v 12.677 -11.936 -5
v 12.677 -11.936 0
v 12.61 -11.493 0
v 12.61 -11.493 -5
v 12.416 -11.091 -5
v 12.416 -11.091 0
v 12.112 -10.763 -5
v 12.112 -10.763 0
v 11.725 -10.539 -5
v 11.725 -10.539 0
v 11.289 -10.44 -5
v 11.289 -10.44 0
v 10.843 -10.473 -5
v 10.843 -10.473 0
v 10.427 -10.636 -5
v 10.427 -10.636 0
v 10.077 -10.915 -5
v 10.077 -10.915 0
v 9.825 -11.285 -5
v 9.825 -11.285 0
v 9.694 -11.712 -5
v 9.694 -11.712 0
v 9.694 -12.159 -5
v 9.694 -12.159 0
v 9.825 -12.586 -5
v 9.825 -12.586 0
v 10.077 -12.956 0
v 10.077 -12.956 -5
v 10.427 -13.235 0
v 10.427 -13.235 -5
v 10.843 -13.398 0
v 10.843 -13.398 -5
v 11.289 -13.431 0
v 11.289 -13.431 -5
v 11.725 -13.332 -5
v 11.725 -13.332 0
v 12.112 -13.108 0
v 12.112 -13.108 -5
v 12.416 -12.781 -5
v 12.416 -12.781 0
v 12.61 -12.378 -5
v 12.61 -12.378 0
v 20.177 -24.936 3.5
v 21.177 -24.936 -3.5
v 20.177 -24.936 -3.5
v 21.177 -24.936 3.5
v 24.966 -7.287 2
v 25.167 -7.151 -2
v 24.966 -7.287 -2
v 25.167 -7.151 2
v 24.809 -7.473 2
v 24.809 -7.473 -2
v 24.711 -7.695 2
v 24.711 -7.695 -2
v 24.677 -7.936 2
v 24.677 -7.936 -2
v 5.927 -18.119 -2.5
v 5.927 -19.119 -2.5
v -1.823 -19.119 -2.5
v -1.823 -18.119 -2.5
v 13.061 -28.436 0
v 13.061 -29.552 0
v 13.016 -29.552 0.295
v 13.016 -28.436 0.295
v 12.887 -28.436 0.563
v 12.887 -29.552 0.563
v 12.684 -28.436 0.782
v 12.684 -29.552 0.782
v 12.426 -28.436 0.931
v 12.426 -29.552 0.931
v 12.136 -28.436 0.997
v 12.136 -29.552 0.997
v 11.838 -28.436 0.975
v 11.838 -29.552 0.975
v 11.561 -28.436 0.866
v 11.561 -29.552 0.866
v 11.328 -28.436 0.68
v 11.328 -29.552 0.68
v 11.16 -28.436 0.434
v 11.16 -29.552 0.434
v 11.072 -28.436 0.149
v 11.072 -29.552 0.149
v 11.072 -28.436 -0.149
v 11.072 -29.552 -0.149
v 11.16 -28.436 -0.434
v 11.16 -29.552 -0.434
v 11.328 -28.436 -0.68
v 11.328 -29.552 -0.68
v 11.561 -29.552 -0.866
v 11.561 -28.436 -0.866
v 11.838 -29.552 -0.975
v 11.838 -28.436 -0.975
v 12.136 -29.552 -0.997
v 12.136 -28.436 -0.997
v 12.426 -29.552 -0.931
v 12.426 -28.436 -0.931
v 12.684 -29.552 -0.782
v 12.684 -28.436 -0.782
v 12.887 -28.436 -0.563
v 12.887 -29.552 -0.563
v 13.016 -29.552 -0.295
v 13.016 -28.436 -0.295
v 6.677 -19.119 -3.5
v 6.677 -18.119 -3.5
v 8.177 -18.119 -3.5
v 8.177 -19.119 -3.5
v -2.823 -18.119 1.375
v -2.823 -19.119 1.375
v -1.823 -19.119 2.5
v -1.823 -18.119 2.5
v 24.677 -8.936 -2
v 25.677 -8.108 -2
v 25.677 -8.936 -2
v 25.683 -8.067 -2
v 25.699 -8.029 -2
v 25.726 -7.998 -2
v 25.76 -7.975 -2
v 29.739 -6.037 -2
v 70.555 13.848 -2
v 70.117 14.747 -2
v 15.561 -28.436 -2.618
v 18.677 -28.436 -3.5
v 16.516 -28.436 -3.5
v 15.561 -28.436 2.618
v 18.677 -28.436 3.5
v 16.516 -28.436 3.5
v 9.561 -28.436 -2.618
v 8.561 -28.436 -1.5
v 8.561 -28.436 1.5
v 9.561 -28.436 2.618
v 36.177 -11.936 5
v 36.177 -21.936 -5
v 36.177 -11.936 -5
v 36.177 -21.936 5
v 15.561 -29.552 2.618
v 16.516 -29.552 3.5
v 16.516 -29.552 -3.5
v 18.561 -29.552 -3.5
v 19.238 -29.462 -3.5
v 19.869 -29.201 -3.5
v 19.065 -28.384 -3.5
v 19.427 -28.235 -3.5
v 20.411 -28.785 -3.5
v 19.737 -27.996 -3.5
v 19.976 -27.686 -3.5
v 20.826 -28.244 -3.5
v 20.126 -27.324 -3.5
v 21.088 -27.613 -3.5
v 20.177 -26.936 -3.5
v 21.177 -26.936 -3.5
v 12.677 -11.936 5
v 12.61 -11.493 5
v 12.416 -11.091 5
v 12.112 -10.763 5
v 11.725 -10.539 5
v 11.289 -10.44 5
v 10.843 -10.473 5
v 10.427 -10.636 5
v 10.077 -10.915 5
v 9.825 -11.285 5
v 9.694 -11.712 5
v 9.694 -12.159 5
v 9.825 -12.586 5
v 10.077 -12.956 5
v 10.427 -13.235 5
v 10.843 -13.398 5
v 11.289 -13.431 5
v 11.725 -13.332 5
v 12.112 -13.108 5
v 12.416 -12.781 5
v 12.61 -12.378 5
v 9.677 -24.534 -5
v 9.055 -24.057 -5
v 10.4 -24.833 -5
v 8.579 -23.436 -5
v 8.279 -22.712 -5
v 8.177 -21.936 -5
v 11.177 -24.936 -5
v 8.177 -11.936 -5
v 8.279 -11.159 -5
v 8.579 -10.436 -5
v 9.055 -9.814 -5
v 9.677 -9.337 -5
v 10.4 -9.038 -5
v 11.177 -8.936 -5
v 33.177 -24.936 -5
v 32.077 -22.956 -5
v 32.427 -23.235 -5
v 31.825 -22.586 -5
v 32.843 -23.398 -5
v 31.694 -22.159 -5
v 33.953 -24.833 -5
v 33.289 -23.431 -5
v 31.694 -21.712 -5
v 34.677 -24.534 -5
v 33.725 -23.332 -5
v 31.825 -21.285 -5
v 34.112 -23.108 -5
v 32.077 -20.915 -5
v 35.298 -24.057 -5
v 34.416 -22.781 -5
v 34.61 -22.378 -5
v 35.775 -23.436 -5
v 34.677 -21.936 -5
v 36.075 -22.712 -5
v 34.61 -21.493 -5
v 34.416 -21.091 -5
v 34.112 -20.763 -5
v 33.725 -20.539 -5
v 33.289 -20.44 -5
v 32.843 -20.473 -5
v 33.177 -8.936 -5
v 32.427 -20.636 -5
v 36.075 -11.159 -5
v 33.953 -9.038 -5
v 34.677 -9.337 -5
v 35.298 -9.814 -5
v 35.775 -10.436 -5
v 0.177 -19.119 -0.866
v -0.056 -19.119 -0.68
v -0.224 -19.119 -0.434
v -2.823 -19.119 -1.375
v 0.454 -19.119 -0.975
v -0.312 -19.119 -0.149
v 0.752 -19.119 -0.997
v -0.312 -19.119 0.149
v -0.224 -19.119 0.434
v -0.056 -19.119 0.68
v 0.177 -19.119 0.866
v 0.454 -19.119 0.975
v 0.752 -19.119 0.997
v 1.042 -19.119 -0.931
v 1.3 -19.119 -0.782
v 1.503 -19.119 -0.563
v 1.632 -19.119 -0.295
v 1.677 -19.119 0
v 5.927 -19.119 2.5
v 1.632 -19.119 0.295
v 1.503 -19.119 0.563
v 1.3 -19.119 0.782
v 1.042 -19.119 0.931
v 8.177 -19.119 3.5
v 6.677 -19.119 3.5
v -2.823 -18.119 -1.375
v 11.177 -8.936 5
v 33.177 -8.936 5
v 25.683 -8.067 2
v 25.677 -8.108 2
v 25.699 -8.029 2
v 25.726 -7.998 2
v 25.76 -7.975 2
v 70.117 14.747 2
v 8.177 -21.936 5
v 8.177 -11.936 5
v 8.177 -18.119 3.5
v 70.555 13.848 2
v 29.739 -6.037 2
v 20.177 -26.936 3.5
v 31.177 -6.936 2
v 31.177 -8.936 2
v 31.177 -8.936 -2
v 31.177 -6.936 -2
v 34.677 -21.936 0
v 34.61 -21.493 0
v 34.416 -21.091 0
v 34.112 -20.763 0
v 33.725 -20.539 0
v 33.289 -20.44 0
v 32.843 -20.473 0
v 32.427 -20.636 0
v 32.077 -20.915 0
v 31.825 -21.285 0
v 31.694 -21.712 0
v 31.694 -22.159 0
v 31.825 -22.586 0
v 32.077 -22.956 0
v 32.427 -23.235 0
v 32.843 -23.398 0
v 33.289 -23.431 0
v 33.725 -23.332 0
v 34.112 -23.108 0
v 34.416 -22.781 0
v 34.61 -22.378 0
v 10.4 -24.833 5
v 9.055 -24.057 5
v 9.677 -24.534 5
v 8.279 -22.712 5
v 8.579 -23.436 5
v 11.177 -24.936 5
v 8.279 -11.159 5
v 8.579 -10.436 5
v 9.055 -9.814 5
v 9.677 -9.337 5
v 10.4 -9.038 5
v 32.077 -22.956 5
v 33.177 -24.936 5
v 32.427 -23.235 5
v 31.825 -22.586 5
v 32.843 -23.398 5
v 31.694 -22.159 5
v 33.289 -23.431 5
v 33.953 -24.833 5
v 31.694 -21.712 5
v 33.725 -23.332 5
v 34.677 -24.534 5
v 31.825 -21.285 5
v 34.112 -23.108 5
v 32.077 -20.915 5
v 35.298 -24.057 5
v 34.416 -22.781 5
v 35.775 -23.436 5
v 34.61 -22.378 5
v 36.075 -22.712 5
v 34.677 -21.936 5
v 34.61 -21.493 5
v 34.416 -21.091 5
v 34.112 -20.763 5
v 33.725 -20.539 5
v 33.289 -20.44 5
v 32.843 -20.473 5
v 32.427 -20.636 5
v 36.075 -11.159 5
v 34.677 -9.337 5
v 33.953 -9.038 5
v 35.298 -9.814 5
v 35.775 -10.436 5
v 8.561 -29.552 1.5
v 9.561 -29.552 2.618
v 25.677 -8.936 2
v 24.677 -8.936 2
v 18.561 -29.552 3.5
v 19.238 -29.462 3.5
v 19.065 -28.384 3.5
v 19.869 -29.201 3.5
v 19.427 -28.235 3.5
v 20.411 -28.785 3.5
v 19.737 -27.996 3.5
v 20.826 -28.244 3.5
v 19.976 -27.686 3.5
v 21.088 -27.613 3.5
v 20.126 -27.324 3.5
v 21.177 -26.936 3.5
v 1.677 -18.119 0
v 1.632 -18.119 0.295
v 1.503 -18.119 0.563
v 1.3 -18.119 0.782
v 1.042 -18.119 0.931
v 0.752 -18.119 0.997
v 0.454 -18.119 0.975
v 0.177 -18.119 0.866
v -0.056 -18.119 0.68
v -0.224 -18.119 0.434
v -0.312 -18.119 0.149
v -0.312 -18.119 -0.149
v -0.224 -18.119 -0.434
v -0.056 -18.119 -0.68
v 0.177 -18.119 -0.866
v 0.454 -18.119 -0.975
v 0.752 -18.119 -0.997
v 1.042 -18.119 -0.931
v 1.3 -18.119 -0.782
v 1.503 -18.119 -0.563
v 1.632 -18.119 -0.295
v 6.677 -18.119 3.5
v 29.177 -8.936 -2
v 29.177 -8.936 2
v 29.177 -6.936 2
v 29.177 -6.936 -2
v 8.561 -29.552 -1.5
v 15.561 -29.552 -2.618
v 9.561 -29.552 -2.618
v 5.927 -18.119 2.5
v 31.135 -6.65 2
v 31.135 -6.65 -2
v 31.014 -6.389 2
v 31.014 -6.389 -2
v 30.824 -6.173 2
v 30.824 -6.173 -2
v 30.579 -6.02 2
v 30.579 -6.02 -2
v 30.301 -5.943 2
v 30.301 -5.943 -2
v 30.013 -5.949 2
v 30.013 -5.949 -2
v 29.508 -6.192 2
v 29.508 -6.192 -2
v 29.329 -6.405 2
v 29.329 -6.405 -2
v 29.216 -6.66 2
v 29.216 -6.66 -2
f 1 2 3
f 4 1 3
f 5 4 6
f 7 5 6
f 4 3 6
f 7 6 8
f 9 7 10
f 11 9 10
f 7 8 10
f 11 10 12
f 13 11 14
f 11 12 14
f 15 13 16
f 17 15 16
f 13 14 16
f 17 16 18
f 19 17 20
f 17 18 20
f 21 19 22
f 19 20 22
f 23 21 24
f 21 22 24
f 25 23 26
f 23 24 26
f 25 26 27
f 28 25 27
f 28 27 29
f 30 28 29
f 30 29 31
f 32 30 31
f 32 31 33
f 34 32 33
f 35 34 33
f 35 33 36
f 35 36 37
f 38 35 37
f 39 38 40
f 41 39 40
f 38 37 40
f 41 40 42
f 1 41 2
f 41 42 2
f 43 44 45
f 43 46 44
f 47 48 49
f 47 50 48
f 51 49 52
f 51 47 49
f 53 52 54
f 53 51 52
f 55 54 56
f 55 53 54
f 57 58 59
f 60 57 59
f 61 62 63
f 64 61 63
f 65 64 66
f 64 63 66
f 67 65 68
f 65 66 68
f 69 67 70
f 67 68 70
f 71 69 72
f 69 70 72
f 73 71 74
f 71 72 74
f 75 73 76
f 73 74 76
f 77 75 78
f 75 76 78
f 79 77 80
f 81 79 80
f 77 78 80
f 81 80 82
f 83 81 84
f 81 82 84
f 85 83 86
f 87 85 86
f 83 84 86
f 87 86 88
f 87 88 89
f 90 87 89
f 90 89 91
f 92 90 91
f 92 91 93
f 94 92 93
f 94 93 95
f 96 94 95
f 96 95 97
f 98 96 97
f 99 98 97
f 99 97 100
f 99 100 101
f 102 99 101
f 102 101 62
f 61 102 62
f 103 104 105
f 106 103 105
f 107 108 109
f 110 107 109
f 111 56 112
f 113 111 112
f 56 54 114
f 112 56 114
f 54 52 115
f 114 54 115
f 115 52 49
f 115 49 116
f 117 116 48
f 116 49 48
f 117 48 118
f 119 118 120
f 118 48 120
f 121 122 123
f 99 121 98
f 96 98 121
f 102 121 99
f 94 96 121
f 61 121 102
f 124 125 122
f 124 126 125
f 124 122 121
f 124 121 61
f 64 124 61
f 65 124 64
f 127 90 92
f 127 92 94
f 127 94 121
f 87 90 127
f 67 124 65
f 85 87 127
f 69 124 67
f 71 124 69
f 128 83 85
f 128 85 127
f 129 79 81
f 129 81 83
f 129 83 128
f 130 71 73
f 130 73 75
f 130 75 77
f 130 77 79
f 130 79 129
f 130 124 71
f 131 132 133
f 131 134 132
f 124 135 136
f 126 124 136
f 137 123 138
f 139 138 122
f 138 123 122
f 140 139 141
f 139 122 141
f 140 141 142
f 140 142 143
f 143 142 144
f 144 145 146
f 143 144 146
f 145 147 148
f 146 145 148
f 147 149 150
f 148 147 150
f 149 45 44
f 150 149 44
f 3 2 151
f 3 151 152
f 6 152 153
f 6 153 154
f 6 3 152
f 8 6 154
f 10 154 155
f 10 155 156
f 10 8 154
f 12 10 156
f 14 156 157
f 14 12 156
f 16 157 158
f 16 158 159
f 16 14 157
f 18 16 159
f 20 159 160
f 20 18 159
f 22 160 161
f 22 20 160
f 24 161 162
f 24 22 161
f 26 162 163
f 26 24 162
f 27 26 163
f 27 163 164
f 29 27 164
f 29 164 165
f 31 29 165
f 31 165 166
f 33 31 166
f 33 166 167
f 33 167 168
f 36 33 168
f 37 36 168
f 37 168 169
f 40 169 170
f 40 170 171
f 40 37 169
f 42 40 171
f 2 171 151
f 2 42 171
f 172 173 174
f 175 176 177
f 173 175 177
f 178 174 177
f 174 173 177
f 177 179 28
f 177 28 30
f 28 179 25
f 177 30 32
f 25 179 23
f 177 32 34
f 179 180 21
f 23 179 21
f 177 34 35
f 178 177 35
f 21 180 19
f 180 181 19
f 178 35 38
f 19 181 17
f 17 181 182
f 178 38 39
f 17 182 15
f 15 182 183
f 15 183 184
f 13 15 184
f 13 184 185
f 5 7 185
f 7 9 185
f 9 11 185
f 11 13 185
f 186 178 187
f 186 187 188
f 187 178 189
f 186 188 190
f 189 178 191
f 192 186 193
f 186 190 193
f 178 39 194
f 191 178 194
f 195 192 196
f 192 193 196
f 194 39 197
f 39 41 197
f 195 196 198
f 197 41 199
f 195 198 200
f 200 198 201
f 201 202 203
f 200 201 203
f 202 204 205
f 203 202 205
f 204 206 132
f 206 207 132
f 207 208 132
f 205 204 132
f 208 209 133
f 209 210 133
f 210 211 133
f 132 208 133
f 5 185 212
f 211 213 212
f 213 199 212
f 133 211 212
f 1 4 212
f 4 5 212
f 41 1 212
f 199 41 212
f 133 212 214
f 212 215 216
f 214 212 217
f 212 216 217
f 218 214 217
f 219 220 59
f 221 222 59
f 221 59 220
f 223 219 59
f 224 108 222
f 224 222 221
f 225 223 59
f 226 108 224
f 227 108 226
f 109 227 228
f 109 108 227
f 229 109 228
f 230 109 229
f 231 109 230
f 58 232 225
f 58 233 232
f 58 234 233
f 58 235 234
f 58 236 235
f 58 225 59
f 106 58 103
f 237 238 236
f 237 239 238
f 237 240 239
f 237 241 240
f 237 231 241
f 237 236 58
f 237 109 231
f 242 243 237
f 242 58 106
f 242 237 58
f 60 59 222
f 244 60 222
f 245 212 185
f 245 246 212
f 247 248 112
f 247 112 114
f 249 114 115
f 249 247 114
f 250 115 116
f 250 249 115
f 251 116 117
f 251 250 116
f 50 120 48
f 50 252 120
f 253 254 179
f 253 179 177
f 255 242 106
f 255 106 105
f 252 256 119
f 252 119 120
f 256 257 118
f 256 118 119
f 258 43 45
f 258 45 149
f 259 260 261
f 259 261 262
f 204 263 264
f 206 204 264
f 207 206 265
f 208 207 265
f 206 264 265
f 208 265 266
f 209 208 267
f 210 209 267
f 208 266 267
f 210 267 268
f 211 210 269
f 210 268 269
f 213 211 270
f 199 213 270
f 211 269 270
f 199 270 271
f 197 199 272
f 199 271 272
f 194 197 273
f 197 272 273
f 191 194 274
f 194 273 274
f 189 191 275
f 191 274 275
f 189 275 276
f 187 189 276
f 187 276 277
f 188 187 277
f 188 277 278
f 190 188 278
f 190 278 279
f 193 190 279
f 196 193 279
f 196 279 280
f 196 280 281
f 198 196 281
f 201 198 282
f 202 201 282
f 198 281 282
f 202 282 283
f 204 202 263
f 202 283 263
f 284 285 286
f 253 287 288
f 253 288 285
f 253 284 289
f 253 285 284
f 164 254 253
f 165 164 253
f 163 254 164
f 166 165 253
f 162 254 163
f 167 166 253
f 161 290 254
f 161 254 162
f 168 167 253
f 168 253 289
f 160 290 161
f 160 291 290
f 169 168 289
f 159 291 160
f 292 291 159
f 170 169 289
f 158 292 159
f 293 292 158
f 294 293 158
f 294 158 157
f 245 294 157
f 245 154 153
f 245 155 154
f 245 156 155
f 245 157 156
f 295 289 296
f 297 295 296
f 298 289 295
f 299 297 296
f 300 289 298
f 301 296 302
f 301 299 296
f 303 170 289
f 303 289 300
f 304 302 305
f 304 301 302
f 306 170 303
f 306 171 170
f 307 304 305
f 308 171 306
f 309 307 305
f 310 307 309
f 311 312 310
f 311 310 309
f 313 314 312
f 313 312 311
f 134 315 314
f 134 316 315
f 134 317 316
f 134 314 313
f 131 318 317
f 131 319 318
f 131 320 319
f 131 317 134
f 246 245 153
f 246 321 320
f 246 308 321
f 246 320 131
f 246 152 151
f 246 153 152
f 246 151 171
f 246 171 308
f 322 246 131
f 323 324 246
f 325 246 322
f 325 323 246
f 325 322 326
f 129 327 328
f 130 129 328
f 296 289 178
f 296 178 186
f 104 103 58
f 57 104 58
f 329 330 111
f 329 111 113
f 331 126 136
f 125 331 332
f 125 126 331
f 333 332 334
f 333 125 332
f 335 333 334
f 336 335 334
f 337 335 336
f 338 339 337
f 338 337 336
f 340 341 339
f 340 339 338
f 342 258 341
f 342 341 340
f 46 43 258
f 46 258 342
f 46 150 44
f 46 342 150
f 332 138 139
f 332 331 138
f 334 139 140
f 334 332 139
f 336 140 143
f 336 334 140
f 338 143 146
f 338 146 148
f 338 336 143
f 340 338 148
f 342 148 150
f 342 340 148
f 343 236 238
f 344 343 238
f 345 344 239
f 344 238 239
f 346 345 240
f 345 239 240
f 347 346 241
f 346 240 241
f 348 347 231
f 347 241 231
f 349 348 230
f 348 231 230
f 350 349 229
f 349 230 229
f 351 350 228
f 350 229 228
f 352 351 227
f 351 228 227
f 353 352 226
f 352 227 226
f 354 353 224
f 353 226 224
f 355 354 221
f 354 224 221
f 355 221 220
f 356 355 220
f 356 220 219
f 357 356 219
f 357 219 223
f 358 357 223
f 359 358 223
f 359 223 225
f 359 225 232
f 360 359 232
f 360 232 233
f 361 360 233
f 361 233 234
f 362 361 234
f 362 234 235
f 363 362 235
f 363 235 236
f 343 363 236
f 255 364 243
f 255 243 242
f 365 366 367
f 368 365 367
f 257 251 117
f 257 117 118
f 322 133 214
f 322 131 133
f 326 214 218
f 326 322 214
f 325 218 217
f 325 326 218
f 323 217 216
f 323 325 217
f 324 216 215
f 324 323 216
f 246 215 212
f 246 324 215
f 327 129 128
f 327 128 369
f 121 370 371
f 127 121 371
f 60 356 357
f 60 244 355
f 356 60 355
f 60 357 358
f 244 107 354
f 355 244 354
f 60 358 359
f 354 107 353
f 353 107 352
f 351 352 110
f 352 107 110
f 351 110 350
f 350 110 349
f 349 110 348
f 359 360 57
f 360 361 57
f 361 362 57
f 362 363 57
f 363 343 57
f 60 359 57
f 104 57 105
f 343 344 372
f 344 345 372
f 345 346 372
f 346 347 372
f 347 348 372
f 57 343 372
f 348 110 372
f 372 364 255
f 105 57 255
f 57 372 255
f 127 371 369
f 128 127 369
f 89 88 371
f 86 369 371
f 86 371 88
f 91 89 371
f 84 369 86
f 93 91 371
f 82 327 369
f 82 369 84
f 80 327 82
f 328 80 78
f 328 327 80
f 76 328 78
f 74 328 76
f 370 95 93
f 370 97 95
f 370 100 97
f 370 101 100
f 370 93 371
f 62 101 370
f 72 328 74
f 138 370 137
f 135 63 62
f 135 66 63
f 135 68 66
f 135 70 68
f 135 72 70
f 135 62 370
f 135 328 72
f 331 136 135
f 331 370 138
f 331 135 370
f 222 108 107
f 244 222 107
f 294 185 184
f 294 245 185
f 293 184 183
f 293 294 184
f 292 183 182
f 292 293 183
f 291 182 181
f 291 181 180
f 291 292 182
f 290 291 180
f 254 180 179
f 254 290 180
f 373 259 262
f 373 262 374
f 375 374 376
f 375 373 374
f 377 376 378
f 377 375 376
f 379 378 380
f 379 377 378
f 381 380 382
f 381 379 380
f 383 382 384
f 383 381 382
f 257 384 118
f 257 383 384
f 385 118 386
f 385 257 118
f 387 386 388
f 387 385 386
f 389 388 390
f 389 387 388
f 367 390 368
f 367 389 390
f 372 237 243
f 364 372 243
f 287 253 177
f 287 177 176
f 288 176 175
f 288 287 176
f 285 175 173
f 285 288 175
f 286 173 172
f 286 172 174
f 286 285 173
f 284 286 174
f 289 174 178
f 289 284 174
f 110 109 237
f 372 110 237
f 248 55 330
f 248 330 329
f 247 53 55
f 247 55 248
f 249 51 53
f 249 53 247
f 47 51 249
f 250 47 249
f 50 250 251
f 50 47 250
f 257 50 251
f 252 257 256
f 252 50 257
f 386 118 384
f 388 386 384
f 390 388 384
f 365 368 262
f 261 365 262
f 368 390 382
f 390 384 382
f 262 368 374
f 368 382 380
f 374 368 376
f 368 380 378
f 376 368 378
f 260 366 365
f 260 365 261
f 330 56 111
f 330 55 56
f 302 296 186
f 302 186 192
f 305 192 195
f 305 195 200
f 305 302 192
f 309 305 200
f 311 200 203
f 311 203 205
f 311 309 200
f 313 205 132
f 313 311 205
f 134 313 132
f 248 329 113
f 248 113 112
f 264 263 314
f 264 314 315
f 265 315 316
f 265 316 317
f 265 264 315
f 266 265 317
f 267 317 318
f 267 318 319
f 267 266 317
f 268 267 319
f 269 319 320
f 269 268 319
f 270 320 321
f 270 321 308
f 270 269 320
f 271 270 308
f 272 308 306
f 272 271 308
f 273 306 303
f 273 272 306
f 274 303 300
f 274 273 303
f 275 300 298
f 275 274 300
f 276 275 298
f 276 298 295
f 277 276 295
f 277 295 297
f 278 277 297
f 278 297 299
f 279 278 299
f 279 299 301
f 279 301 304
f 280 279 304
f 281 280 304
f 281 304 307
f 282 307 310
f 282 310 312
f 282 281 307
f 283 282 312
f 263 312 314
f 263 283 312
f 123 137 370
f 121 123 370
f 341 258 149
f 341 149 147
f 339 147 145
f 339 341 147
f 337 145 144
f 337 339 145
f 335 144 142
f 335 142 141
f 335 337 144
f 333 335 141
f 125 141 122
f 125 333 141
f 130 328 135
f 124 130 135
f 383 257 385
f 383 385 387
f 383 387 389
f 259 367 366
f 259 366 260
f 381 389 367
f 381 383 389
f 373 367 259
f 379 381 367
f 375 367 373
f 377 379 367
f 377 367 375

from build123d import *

# Parameters (mm, degrees)
F0_R          = 1.5
F1_DEPTH      = 5
F1_DEPTH_BACK = 5
F0_W          = 2
F0_H          = 2
F2_DEPTH      = 2
F2_DEPTH_BACK = 2
F3_DEPTH      = 2
F3_DEPTH_BACK = 2
F4_DEPTH      = 3.5
F4_DEPTH_BACK = 3.5
F0_W_2        = 11
F0_H_2        = 1
F5_DEPTH      = 3.5
F5_DEPTH_BACK = 3.5
F6_R          = 1
F7_DEPTH      = 3.08035
F8_R          = 1
F9_DEPTH      = 25


with BuildPart() as f1:
    # F0 (on Top) → F1 (new body, two sides)
    with BuildSketch(Plane.XY) as f1_sk:
        with BuildLine():
            Line((24.676793, -8.935527), (11.176793, -8.935527))
            ThreePointArc((11.176793, -8.935527), (9.055472, -9.814207), (8.176793, -11.935527))
            Line((8.176793, -11.935527), (8.176793, -18.119132))
            Line((8.176793, -18.119132), (8.176793, -19.119132))
            Line((8.176793, -19.119132), (8.176793, -21.935527))
            ThreePointArc((8.176793, -21.935527), (9.055472, -24.056847), (11.176793, -24.935527))
            Line((11.176793, -24.935527), (15.126595, -24.935527))
            Line((15.126595, -24.935527), (20.176793, -24.935527))
            Line((20.176793, -24.935527), (21.176793, -24.935527))
            Line((21.176793, -24.935527), (33.176793, -24.935527))
            ThreePointArc((33.176793, -24.935527), (35.298113, -24.056847), (36.176793, -21.935527))
            Line((36.176793, -21.935527), (36.176793, -11.935527))
            ThreePointArc((36.176793, -11.935527), (35.298113, -9.814207), (33.176793, -8.935527))
            Line((33.176793, -8.935527), (31.176793, -8.935527))
            Line((31.176793, -8.935527), (29.176793, -8.935527))
            Line((29.176793, -8.935527), (25.676793, -8.935527))
            Line((25.676793, -8.935527), (24.676793, -8.935527))
        make_face()
        with Locations((33.176793, -21.935527)):
            Circle(F0_R, mode=Mode.SUBTRACT)
        with Locations((11.176793, -11.935527)):
            Circle(F0_R, mode=Mode.SUBTRACT)
    extrude(amount=F1_DEPTH)
    extrude(f1_sk.sketch, amount=-F1_DEPTH_BACK)


with BuildPart() as f2:
    # F0 (on Top) → F2 (new body, two sides)
    with BuildSketch(Plane.XY) as f2_sk:
        with Locations((30.176793, -7.935527)):
            Rectangle(F0_W, F0_H)
        with BuildLine():
            ThreePointArc((29.738829, -6.036534), (29.328865, -6.405415), (29.176793, -6.935527))
            Line((29.176793, -6.935527), (31.176793, -6.935527))
            ThreePointArc((31.176793, -6.935527), (30.706904, -6.087599), (29.738829, -6.036534))
        make_face()
    extrude(amount=F2_DEPTH)
    extrude(f2_sk.sketch, amount=-F2_DEPTH_BACK)


with BuildPart() as f3:
    # F0 (on Top) → F3 (new body, two sides)
    with BuildSketch(Plane.XY) as f3_sk:
        with BuildLine():
            Line((24.676793, -7.935527), (24.676793, -8.935527))
            Line((24.676793, -8.935527), (25.676793, -8.935527))
            Line((25.676793, -8.935527), (25.676793, -8.107648))
            ThreePointArc((25.676793, -8.107648), (25.699221, -8.029463), (25.759686, -7.975057))
            Line((25.759686, -7.975057), (29.738829, -6.036534))
            Line((29.738829, -6.036534), (70.554594, 13.847723))
            Line((70.554594, 13.847723), (70.116631, 14.746716))
            Line((70.116631, 14.746716), (25.166988, -7.151447))
            ThreePointArc((25.166988, -7.151447), (24.809426, -7.473176), (24.676793, -7.935527))
        make_face()
    extrude(amount=F3_DEPTH)
    extrude(f3_sk.sketch, amount=-F3_DEPTH_BACK)


with BuildPart() as f4:
    # F0 (on Top) → F4 (new body, two sides)
    with BuildSketch(Plane.XY) as f4_sk:
        with BuildLine():
            Line((21.176793, -24.935527), (20.176793, -24.935527))
            Line((20.176793, -24.935527), (20.176793, -26.935527))
            ThreePointArc((20.176793, -26.935527), (19.737453, -27.996187), (18.676793, -28.435527))
            Line((18.676793, -28.435527), (15.126595, -28.435527))
            Line((15.126595, -28.435527), (8.560788, -28.435527))
            Line((8.560788, -28.435527), (8.560788, -29.551531))
            Line((8.560788, -29.551531), (18.560788, -29.551531))
            ThreePointArc((18.560788, -29.551531), (20.410583, -28.785321), (21.176793, -26.935527))
            Line((21.176793, -26.935527), (21.176793, -24.935527))
        make_face()
    extrude(amount=F4_DEPTH)
    extrude(f4_sk.sketch, amount=-F4_DEPTH_BACK)

    # F6 (on face) → F7 (cut)
    with BuildSketch(Plane.XZ.offset(29.551531)):
        Polygon((8.560788, -3.5), (16.515846, -3.5), (15.560788, -2.618034), (9.560788, -2.618034), (8.560788, -1.5), align=None)
        Polygon((15.560788, 2.618034), (16.515846, 3.5), (8.560788, 3.5), (8.560788, 1.5), (9.560788, 2.618034), align=None)
        with Locations((12.060788, 0)):
            Circle(F6_R)
    extrude(amount=-F7_DEPTH, mode=Mode.SUBTRACT)


with BuildPart() as f5:
    # F0 (on Top) → F5 (new body, two sides)
    with BuildSketch(Plane.XY) as f5_sk:
        with Locations((2.676793, -18.619132)):
            Rectangle(F0_W_2, F0_H_2)
    extrude(amount=F5_DEPTH)
    extrude(f5_sk.sketch, amount=-F5_DEPTH_BACK)

    # F8 (on face) → F9 (cut)
    with BuildSketch(Plane.XZ.offset(29.551531)):
        Polygon((5.926793, 2.5), (6.676793, 3.5), (-2.823207, 3.5), (-2.823207, 1.374733), (-1.823207, 2.5), align=None)
        with Locations((0.676793, 0)):
            Circle(F8_R)
        Polygon((-2.823207, -3.5), (6.676793, -3.5), (5.926793, -2.5), (-1.823207, -2.5), (-2.823207, -1.375267), align=None)
    extrude(amount=-F9_DEPTH, mode=Mode.SUBTRACT)


solid = Compound([f1.part, f2.part, f3.part, f4.part, f5.part])
